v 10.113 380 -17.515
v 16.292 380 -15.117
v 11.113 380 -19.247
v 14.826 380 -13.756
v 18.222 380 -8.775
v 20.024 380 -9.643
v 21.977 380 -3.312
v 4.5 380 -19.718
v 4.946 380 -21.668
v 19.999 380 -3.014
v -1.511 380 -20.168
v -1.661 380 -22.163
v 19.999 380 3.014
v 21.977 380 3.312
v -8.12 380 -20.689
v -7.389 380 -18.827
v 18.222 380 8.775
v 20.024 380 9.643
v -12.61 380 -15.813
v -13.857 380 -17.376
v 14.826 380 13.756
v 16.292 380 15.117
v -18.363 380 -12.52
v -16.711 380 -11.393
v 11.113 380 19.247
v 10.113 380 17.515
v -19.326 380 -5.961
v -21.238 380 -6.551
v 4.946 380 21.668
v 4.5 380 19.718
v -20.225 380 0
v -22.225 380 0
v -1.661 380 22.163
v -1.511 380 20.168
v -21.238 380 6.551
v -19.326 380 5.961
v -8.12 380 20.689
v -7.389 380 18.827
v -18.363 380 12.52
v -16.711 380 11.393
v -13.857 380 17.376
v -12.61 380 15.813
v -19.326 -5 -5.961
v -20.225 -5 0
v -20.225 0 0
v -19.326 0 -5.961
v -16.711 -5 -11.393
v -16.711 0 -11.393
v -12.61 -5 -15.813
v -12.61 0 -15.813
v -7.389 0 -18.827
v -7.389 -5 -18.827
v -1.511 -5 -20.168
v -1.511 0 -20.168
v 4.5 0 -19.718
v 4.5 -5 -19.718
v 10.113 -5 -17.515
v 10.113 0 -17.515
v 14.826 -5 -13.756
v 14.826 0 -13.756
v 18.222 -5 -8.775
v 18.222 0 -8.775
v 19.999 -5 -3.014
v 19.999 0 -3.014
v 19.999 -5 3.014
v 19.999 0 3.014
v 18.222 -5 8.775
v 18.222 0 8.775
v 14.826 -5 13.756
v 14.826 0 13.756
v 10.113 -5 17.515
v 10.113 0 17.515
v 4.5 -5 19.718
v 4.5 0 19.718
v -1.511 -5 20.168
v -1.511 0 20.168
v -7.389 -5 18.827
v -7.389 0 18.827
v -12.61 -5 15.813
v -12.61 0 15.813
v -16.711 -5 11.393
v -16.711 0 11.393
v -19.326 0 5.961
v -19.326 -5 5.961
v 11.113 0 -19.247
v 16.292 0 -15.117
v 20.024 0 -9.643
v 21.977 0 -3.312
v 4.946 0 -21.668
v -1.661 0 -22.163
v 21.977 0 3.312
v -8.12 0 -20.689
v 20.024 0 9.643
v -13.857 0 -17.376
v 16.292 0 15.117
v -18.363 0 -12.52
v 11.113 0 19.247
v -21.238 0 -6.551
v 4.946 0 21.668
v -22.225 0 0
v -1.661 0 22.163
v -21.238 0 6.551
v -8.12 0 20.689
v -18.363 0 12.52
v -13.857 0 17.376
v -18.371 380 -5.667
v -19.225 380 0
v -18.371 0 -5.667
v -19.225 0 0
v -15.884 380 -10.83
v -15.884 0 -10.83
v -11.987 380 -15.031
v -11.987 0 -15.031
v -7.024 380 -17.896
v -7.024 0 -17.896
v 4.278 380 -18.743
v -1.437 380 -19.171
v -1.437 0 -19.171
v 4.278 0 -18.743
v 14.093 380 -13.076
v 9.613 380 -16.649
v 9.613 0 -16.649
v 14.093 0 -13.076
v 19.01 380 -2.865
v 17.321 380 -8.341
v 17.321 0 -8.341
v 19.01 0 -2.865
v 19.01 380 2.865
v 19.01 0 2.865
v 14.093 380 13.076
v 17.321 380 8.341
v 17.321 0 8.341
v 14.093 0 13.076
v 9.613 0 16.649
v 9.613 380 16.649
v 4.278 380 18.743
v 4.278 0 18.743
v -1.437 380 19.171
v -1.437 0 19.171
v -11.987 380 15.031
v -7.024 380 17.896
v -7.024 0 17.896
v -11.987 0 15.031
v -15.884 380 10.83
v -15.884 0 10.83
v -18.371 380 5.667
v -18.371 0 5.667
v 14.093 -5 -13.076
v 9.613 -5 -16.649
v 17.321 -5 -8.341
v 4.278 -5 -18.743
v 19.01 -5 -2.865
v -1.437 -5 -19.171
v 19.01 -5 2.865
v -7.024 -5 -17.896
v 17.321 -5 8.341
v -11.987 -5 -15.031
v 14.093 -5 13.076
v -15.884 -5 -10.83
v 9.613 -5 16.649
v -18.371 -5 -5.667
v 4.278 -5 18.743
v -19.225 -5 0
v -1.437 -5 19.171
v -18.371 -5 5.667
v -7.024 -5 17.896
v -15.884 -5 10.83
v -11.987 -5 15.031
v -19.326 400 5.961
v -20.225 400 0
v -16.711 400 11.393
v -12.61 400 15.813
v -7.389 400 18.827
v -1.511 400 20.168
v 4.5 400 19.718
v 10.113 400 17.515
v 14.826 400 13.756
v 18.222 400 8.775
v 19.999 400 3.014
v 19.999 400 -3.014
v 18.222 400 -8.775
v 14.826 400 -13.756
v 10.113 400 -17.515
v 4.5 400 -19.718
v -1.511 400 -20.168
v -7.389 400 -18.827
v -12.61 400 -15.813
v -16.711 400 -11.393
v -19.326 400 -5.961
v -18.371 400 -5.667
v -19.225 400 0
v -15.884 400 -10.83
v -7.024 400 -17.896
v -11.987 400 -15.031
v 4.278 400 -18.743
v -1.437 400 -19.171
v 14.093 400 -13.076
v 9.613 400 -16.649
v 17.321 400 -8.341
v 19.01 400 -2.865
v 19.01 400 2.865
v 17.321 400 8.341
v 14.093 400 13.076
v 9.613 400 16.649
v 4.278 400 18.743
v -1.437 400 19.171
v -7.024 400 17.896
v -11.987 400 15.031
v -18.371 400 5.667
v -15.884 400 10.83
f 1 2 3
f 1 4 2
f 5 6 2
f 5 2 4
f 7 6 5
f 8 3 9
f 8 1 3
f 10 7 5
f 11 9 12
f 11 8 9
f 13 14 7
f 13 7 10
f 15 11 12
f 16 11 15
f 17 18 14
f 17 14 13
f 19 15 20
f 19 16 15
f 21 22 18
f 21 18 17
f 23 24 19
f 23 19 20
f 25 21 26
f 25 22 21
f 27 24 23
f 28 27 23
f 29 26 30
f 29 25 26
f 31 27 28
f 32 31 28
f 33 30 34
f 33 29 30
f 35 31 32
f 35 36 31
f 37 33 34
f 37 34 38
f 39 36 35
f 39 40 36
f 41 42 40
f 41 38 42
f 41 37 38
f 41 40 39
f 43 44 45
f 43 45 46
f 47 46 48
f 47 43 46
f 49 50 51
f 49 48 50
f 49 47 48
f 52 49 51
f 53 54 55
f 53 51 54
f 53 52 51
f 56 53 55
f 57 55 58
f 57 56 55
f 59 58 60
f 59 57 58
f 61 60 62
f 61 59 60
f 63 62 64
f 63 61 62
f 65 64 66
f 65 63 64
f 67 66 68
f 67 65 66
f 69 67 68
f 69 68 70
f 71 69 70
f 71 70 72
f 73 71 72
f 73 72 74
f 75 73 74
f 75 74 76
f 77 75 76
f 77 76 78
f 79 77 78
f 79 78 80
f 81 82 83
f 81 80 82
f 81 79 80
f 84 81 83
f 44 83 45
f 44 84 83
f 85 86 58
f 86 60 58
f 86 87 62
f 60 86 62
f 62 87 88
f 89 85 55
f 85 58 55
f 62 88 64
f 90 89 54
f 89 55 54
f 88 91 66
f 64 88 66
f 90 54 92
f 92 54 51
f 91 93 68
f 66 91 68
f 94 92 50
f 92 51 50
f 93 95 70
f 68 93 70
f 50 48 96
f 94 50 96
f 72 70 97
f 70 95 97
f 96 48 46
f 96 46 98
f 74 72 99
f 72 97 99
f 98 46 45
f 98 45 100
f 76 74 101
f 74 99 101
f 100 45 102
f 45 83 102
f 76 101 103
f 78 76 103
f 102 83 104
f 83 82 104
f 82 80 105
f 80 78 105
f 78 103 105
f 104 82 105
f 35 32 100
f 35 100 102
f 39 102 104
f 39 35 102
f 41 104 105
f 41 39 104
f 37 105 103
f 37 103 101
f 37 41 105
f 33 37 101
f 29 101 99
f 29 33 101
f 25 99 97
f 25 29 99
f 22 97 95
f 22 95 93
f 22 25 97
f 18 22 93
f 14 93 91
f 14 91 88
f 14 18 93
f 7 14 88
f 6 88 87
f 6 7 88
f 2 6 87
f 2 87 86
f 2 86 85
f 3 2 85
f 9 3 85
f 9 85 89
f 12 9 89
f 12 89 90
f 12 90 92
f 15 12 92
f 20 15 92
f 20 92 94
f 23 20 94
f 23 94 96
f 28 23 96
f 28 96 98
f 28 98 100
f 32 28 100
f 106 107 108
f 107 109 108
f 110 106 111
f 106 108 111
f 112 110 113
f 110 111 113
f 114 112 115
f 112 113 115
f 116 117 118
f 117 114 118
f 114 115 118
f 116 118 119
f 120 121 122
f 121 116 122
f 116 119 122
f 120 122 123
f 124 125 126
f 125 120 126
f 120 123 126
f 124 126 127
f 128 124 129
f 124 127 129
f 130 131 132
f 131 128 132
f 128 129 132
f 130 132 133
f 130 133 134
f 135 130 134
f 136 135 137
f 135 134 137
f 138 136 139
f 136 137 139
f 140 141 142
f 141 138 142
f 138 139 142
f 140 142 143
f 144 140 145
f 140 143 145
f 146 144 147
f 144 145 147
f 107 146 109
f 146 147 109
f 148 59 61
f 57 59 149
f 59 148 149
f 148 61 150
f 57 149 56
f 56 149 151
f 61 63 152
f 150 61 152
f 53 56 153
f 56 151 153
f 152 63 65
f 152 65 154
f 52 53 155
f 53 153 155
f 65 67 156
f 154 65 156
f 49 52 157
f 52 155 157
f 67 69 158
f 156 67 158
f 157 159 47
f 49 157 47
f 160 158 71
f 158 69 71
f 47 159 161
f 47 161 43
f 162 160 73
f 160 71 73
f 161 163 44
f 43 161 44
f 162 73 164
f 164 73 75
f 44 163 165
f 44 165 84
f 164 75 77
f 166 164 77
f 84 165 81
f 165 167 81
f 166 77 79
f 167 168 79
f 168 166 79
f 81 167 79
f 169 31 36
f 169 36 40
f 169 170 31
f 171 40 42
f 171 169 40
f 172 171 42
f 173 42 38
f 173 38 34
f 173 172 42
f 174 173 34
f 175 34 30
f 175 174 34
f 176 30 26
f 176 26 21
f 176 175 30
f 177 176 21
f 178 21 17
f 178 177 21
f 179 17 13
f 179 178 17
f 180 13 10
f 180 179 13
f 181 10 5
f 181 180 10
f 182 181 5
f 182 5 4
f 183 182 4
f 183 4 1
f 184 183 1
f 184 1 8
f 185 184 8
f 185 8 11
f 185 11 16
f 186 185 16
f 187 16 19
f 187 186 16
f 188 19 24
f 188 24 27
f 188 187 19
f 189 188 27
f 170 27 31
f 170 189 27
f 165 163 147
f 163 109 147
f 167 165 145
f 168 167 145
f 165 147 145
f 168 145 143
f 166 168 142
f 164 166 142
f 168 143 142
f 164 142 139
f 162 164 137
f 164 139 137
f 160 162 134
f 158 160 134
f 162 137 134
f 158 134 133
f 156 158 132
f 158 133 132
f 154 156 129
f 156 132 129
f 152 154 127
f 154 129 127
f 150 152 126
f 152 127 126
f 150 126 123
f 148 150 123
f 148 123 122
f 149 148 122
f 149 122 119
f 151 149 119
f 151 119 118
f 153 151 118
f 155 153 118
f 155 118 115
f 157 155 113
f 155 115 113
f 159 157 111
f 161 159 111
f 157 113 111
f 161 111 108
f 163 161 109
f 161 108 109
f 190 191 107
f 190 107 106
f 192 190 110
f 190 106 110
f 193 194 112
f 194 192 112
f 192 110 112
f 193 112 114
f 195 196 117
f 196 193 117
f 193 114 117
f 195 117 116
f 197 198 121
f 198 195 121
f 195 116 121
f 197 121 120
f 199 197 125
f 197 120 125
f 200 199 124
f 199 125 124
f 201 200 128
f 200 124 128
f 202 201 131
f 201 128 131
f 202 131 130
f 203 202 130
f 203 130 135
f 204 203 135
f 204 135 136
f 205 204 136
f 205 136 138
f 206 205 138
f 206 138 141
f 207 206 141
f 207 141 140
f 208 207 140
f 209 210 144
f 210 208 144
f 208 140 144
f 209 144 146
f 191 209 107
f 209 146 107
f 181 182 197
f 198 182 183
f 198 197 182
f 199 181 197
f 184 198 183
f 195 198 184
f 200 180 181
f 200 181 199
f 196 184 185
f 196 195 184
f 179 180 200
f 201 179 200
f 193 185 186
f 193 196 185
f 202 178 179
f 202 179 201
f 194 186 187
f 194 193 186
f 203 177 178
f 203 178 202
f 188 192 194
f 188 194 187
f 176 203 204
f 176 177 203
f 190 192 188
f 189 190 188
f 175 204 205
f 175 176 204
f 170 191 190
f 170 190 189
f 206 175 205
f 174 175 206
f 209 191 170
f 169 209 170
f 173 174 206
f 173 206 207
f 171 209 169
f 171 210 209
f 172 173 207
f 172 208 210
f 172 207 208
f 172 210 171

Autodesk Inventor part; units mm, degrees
ref_plane "YZ Plane" through (0, 0, 0) normal (1, 0, 0) x (0, 1, 0)
ref_plane "XZ Plane" through (0, 0, 0) normal (0, 1, 0) x (-1, 0, 0)
ref_plane "XY Plane" through (0, 0, 0) normal (0, 0, 1) x (1, 0, 0)
sketch "Sketch1" plane through (0, 0, 0) normal (0, 0, 1) x (1, 0, 0)
  line L0 (-19.225, 0) -> (-22.225, 0)
  line L1 (-22.225, 0) -> (-22.225, 380)
  line L2 (-22.225, 380) -> (-19.225, 380)
  line L3 (-19.225, 380) -> (-19.225, 0)
  line L4 (0, -86) -> (0, 481) projected
  line L5 (-19.225, 380) -> (-20.225, 380)
  line L6 (-20.225, 380) -> (-20.225, 400)
  line L7 (-20.225, 400) -> (-19.225, 400)
  line L8 (-19.225, 400) -> (-19.225, 380)
  line L9 (-19.225, 0) -> (-20.225, 0)
  line L10 (-20.225, 0) -> (-20.225, -5)
  line L11 (-20.225, -5) -> (-19.225, -5)
  line L12 (-19.225, -5) -> (-19.225, 0)
  point P0 (0, 0)
  point P1 (-20.225, 0)
  dimension "d0" = 22.225
  dimension "d1" = 3
  dimension "d2" = 380
  dimension "d4" = 1
  dimension "d5" = 20
  dimension "d6" = 1
  dimension "d7" = 5
revolve "Revolution1" add sketch "Sketch1" angle 360 about axis through (0, -10, 0) along (0, 1, 0)
properties part number "BodyCylinder" material "Brass"
